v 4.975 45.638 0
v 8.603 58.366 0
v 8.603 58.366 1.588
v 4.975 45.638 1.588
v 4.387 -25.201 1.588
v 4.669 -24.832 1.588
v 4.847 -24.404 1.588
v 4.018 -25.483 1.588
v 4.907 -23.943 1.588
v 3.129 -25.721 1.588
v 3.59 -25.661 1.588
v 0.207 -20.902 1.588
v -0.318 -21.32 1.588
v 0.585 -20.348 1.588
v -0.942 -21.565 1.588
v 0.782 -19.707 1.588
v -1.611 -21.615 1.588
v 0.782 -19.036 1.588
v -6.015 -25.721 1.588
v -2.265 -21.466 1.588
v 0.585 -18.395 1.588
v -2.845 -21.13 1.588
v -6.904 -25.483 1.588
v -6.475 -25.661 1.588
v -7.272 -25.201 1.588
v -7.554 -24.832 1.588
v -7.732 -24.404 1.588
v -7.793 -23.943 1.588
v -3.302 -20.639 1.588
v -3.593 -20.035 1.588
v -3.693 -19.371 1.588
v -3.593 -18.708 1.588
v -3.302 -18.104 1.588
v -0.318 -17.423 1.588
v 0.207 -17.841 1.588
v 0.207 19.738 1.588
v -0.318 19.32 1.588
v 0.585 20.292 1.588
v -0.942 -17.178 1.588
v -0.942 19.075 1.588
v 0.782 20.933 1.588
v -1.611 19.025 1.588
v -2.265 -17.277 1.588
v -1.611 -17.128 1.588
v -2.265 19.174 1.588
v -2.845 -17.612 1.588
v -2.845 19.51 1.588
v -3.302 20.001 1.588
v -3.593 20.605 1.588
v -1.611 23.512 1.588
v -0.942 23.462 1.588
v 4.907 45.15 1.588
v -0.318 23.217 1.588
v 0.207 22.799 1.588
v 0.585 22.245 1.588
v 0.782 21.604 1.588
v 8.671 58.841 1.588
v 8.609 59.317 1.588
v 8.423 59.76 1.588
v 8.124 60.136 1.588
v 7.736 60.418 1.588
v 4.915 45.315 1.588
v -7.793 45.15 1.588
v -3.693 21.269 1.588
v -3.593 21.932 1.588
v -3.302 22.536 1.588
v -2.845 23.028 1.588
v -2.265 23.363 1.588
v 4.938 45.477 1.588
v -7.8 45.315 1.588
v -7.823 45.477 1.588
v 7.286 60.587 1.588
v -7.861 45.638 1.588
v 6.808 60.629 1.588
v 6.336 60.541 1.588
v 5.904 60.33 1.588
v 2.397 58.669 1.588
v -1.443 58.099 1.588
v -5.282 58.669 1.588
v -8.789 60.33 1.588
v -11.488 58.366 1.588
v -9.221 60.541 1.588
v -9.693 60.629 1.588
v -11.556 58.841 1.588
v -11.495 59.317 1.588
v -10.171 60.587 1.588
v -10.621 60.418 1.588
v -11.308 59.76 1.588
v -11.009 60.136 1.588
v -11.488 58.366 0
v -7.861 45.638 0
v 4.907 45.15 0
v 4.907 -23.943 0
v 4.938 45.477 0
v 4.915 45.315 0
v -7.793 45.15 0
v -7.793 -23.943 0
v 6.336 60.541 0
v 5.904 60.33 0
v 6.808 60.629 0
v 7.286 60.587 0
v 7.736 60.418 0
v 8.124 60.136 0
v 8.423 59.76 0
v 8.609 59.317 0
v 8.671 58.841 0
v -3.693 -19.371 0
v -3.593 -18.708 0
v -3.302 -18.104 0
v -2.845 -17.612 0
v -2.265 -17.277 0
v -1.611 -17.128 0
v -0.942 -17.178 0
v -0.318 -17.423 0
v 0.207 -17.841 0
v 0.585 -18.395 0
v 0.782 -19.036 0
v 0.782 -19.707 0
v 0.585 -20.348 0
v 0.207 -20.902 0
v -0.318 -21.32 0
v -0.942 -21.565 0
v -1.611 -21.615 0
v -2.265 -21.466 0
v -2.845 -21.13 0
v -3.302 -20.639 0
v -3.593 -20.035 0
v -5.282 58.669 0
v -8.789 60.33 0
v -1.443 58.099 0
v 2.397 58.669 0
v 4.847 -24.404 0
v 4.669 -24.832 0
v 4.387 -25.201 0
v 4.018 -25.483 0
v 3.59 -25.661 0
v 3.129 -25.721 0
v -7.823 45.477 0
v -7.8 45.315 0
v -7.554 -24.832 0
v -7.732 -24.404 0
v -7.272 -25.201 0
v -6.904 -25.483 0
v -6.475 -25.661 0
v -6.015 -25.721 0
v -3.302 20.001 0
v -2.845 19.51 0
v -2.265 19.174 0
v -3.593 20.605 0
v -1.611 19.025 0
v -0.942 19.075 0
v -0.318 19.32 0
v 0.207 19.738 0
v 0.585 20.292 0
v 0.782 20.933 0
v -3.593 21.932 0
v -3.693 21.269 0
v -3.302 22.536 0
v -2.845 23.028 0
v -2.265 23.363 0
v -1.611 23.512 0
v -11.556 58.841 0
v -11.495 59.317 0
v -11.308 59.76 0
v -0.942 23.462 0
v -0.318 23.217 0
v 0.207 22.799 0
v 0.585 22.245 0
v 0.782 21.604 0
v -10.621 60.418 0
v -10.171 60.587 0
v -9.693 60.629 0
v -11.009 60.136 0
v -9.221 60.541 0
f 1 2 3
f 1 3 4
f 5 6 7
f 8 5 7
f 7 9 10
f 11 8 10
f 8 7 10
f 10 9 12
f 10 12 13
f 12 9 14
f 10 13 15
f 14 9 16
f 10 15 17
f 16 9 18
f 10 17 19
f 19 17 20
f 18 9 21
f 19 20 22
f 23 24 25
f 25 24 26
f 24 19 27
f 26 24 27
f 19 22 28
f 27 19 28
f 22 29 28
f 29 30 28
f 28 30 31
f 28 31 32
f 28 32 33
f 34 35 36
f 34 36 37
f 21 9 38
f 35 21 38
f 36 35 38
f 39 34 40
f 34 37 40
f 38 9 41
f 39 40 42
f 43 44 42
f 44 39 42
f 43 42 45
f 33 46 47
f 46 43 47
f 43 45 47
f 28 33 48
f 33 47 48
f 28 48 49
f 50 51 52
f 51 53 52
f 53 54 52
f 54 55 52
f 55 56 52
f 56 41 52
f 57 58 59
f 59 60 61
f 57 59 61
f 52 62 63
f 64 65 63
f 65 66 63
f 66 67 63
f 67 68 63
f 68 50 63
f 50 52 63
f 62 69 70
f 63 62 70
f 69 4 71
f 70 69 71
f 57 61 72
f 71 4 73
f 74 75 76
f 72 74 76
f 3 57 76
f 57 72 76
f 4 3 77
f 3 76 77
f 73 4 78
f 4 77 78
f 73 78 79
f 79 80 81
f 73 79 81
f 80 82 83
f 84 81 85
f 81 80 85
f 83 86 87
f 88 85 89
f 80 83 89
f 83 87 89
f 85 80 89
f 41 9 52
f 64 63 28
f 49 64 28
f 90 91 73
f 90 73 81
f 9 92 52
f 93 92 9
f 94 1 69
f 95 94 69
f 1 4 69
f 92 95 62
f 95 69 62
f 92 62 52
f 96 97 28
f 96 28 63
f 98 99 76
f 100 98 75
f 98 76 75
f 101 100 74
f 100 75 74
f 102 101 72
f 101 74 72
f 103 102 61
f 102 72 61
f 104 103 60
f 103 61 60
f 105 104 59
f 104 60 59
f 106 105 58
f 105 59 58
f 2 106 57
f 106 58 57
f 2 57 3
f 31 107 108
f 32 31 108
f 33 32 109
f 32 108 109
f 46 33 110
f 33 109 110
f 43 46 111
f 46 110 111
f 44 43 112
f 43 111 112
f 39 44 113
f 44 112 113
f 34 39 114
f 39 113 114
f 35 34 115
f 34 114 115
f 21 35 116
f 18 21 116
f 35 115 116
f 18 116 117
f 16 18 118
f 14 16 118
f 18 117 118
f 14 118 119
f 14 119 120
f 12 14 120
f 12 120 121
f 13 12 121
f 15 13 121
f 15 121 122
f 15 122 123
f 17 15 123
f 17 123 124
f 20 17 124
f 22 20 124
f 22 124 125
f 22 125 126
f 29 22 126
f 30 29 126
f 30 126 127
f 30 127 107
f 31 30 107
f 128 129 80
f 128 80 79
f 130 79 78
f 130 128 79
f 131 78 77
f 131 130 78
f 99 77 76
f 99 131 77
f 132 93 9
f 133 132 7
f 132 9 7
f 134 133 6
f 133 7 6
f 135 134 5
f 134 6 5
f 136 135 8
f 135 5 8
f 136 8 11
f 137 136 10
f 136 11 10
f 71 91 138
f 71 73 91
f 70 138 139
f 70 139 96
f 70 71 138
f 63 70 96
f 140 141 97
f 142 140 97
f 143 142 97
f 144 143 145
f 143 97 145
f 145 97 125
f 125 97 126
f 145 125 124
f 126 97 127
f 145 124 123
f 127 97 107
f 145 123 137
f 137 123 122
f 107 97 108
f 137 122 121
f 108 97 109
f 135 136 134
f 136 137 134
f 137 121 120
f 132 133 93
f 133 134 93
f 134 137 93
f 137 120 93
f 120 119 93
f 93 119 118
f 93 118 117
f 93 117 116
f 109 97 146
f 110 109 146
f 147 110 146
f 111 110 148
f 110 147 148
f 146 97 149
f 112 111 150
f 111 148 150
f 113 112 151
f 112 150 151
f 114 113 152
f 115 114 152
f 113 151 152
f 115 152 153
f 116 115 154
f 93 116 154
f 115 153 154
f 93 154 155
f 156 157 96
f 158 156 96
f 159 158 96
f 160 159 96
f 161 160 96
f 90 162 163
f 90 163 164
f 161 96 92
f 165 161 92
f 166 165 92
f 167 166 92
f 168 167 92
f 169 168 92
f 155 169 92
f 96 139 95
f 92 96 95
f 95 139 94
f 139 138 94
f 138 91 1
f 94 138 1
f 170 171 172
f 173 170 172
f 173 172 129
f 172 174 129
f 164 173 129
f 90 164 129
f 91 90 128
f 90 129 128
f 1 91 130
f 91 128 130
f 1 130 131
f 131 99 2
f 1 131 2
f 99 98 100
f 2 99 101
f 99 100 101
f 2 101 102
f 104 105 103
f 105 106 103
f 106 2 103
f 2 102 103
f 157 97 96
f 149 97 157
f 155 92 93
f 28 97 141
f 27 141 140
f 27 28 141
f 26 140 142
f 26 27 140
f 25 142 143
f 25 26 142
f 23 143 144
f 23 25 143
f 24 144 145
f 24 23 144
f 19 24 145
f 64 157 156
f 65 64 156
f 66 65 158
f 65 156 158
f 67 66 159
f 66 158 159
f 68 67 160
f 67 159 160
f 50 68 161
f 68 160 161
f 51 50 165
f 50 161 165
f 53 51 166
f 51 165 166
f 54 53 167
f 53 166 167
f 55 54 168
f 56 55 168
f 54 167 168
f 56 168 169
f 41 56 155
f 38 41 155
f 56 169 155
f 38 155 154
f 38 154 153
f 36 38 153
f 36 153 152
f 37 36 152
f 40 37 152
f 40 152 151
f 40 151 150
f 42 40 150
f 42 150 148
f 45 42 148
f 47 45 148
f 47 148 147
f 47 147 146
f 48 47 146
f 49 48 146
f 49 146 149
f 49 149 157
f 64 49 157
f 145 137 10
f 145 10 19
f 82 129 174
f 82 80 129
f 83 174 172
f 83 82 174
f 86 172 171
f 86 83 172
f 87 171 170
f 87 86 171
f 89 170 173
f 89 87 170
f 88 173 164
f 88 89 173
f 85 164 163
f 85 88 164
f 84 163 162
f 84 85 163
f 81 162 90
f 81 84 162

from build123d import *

# Parameters (mm, degrees)
SKETCH1_R            = 2.625
BOSS_EXTRUDE1_DEPTH  = 1.5875
FILLET1_R            = 1.778
M4_CLEARANCE_HOLE1_D = 4.5


with BuildPart() as part:
    # Sketch1 → Boss-Extrude1 (new body)
    # profile 1 of 3: a face of its own
    with BuildSketch(Plane.XY):
        with BuildLine():
            ThreePointArc((-14.144818028, 67.686446389), (-1.442639673, 58.098657577), (11.259538681, 67.686446389))
            Line((11.259538681, 67.686446389), (4.907360327, 45.398657577))
            Line((4.907360327, 45.398657577), (4.907360327, -25.721342423))
            Line((4.907360327, -25.721342423), (-7.792639673, -25.721342423))
            Line((-7.792639673, -25.721342423), (-7.792639673, 45.398657577))
            Line((-7.792639673, 45.398657577), (-14.144818028, 67.686446389))
        make_face()
        with Locations((-1.442639673, -19.371342423)):
            Circle(SKETCH1_R, mode=Mode.SUBTRACT)
        with Locations((-1.442639673, 21.268657577)):
            Circle(SKETCH1_R, mode=Mode.SUBTRACT)
    # profile 2 of 3: a face of its own
    with BuildSketch(Plane.XY):
        with Locations((-1.442639673, 21.268657577)):
            Circle(SKETCH1_R)
    # profile 3 of 3: a face of its own
    with BuildSketch(Plane.XY):
        with Locations((-1.442639673, -19.371342423)):
            Circle(SKETCH1_R)
    extrude(amount=BOSS_EXTRUDE1_DEPTH)

    # Fillet1
    fillet1_edges = [part.edges().sort_by_distance(p)[0] for p in [
        (11.259538681, 67.686446389, 0.79375),
        (4.907360327, 45.398657577, 0.79375),
        (4.907360327, -25.721342423, 0.79375),
        (-7.792639673, -25.721342423, 0.79375),
        (-7.792639673, 45.398657577, 0.79375),
        (-14.144818028, 67.686446389, 0.79375),
    ]]
    fillet(fillet1_edges, radius=FILLET1_R)

    # M4 Clearance Hole1 (through all)
    with Locations(Plane.XY.offset(1.5875)):
        with Locations((-1.442639673, -19.371342423), (-1.442639673, 21.268657577)):
            Hole(M4_CLEARANCE_HOLE1_D / 2)


solid = part.part
